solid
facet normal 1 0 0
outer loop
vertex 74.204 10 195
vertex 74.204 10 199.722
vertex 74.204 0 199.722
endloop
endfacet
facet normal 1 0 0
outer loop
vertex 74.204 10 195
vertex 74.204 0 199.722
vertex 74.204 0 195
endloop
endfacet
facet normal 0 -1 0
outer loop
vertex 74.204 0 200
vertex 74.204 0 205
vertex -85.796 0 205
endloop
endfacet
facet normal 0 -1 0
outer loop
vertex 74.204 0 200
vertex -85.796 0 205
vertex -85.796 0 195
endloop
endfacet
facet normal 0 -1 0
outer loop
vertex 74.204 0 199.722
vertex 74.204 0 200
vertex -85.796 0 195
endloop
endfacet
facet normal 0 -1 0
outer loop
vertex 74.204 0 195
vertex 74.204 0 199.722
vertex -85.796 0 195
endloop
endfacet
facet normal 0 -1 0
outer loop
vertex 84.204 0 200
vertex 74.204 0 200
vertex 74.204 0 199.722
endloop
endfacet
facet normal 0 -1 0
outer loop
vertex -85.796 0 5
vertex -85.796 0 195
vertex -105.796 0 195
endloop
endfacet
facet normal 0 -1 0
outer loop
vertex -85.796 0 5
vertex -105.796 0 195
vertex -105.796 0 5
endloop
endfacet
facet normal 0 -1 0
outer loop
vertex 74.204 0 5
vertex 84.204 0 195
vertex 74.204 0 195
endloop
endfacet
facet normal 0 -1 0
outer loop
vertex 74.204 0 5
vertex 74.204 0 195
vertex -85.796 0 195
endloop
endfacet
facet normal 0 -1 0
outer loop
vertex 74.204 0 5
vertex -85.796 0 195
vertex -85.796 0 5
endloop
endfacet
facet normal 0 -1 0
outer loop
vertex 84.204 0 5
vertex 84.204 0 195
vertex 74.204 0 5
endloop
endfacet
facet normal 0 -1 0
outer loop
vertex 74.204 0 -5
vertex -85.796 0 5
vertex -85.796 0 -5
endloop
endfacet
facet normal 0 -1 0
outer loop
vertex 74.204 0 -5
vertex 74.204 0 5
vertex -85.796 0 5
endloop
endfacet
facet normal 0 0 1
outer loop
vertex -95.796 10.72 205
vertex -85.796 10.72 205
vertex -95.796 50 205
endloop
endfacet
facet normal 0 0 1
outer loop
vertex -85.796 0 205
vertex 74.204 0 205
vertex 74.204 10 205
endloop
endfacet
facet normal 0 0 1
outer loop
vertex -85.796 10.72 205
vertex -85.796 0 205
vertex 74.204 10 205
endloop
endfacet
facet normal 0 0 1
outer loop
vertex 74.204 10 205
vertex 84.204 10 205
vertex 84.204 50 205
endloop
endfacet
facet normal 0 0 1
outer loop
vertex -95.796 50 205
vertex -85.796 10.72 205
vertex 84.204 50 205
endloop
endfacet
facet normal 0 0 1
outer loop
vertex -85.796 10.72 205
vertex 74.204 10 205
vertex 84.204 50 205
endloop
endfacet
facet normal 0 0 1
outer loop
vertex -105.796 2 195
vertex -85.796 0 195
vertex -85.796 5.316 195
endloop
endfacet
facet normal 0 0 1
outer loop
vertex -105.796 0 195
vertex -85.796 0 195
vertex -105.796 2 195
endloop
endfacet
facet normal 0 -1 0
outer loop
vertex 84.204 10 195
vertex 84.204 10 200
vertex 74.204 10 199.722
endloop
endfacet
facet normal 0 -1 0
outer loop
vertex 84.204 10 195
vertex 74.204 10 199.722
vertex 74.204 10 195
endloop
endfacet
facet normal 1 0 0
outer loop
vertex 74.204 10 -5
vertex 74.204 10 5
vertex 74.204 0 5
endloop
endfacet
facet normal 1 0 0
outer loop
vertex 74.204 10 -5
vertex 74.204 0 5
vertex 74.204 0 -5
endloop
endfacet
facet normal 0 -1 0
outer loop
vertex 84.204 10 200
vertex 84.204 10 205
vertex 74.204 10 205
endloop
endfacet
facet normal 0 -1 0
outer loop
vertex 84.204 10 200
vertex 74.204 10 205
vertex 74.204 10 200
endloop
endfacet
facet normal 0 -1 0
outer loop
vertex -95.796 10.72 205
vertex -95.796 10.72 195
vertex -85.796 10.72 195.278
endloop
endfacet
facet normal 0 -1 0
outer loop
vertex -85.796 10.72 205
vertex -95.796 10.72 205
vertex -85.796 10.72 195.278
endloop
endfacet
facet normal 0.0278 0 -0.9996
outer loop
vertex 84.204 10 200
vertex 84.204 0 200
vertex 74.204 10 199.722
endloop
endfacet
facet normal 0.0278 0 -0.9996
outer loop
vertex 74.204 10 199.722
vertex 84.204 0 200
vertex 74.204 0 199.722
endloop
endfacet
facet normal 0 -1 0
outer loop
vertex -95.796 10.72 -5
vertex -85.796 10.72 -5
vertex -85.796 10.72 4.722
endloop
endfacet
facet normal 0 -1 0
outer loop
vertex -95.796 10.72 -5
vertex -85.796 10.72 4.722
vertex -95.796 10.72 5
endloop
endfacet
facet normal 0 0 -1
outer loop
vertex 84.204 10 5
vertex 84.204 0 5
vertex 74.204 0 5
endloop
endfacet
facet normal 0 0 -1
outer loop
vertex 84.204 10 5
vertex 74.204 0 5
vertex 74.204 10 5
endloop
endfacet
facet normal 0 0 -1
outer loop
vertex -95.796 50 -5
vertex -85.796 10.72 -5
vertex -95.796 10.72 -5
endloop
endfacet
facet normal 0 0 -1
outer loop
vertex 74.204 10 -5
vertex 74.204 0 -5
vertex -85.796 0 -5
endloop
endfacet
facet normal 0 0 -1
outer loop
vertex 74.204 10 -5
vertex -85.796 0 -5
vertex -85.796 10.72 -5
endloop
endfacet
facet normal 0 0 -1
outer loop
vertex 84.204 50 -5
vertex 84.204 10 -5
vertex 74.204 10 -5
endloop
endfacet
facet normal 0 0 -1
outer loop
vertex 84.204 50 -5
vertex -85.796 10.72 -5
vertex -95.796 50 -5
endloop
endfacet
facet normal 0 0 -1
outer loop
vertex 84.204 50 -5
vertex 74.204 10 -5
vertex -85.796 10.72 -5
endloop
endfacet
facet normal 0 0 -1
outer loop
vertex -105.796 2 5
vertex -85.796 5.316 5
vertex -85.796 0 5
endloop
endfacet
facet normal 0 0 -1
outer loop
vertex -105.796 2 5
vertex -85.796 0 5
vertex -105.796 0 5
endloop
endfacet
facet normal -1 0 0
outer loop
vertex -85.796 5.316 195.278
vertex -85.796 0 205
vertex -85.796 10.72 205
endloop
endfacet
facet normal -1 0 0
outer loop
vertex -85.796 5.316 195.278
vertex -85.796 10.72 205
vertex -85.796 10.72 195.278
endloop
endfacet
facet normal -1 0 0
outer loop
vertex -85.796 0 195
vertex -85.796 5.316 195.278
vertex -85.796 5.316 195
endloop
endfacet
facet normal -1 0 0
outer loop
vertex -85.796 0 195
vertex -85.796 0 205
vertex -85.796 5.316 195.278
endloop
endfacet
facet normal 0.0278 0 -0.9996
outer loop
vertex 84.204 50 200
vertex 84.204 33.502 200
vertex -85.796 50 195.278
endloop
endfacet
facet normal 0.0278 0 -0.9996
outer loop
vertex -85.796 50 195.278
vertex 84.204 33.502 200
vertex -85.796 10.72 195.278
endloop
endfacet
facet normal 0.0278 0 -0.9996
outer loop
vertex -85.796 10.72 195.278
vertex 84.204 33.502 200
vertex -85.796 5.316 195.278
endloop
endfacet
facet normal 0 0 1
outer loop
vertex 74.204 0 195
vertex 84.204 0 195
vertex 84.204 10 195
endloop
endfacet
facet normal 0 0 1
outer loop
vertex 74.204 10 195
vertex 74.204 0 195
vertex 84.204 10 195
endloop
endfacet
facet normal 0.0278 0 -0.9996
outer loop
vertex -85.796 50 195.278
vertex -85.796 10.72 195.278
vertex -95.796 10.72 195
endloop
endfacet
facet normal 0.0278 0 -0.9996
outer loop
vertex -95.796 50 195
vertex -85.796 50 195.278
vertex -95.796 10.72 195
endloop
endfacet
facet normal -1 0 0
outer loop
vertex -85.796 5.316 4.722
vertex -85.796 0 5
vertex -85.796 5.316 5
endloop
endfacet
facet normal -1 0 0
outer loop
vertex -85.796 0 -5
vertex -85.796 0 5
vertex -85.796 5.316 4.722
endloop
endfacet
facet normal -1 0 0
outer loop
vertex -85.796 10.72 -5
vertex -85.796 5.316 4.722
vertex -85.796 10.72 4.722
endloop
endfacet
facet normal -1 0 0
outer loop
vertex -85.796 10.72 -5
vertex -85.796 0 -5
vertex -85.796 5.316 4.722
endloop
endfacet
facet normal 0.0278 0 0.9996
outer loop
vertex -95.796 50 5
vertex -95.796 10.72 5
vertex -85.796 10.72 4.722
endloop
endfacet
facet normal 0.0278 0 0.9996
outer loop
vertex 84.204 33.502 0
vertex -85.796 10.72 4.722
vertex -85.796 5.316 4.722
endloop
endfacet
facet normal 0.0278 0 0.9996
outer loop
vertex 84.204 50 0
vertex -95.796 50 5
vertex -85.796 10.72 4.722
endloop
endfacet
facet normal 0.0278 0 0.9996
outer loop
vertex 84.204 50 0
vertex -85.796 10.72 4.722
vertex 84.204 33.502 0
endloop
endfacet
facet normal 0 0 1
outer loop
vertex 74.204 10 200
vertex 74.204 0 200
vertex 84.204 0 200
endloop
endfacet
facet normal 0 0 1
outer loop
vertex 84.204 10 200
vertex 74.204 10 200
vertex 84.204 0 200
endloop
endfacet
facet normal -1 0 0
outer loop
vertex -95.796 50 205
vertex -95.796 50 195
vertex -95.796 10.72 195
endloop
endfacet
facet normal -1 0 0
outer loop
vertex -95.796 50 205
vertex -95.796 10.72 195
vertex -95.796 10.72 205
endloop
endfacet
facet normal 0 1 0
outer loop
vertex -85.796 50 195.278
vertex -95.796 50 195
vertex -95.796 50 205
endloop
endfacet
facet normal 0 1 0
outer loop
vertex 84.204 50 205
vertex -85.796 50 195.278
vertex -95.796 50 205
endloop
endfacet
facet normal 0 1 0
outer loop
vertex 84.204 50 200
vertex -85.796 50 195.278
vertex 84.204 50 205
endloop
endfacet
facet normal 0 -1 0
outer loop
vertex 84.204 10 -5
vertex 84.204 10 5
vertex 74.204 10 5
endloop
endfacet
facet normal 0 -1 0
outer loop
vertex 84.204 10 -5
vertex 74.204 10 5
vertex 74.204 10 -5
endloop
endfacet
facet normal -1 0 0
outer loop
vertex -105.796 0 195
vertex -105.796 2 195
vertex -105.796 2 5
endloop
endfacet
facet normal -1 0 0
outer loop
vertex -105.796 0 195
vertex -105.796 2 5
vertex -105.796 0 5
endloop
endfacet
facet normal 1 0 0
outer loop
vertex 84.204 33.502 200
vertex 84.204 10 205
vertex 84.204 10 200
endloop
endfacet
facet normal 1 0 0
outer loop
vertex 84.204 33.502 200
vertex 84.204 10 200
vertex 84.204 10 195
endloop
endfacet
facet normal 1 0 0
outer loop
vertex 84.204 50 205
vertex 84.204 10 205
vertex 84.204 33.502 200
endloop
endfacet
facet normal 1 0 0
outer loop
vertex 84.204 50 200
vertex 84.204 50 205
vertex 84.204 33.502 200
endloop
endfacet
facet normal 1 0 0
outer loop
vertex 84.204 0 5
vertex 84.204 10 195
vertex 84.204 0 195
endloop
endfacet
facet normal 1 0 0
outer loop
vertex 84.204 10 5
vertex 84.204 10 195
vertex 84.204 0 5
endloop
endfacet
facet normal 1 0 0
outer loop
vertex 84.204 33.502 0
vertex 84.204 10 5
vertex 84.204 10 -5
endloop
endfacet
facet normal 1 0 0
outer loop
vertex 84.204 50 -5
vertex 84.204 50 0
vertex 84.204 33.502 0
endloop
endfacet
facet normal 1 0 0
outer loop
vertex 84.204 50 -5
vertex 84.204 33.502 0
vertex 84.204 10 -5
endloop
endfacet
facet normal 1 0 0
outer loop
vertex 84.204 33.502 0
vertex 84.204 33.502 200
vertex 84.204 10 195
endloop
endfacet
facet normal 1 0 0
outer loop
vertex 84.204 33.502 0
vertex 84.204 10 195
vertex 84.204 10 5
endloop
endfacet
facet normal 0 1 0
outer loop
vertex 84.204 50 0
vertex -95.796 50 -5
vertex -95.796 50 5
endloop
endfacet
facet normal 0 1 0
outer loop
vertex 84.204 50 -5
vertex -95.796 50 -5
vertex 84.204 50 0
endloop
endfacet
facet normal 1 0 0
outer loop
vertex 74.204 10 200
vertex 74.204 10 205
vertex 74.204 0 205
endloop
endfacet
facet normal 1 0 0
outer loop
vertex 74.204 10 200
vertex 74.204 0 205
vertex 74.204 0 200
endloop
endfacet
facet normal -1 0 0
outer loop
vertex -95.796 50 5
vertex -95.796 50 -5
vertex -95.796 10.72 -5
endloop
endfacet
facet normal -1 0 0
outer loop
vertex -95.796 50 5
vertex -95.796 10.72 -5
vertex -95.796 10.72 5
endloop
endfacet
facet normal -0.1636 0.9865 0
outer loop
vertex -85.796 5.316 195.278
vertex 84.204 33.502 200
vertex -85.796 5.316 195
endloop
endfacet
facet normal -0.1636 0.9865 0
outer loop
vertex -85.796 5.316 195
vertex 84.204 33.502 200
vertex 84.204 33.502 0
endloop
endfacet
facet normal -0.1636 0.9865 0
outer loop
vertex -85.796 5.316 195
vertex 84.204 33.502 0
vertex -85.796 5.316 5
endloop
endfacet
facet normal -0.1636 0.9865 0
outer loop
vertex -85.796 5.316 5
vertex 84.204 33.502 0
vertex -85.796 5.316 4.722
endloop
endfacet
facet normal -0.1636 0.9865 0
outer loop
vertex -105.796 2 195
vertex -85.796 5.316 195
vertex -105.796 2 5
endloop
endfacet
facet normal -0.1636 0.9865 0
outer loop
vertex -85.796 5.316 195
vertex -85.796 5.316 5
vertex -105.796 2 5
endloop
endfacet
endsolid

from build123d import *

# Parameters (mm, degrees)
BOSS_EXTRU_1_DEPTH      = 200
ESQUISSE4_W             = 5
ESQUISSE4_H             = 50
BOSS_EXTRU_4_DEPTH      = 180
BOSS_EXTRU_7_REACH      = 238.046
ESQUISSE5_W             = 10
ESQUISSE5_H             = 10
ENL_V_MAT_EXTRU_1_DEPTH = 10
ESQUISSE6_W             = 20
ESQUISSE6_H             = 10.719834163
ENL_V_MAT_EXTRU_2_DEPTH = 10
SYM_TRIE3_DEPTH         = 10.719834163
SYM_TRIE3_2_DEPTH       = 50
SYM_TRIE3_START         = 10.719834163
SYM_TRIE3_3_DEPTH       = 39.280165837


# Read off the part's stored shape, not the designer's step: Symétrie3
with BuildPart() as part:
    # Esquisse1 → Boss.-Extru.1 (new body)
    with BuildSketch(Plane.XY):
        Polygon((-105.796013405, 0), (84.203986595, 0), (84.203986595, 33.502126335), (-105.796013405, 2), align=None)
    extrude(amount=BOSS_EXTRU_1_DEPTH)

    # Esquisse4 → Boss.-Extru.4 (add)
    with BuildSketch(Plane(origin=(84.203986595, 0, 0), x_dir=(0, 0, -1), z_dir=(1, 0, 0))):
        with Locations((-202.5, 25)):
            Rectangle(ESQUISSE4_W, ESQUISSE4_H)
        with Locations((2.5, 25)):
            Rectangle(ESQUISSE4_W, ESQUISSE4_H)
    extrude(amount=-BOSS_EXTRU_4_DEPTH)

    # Boss.-Extru.7: up to this plane
    boss_extru_7_end = Plane(origin=(-105.796013405, 2, 200), z_dir=(0.16356768062493265, -0.9865321149638162, 0))
    # Esquisse8 → Boss.-Extru.7 (add, up to the surface)
    with BuildSketch(Plane(origin=(0, 50, 0), x_dir=(1, 0, 0), z_dir=(0, 1, 0)), mode=Mode.PRIVATE) as boss_extru_7_sk1:
        Polygon((84.203986595, 0), (-95.796013405, 0), (-95.796013405, -5), align=None)
    boss_extru_7_tool1 = split(extrude(boss_extru_7_sk1.sketch, amount=-BOSS_EXTRU_7_REACH, mode=Mode.PRIVATE), bisect_by=boss_extru_7_end, keep=Keep.BOTH, mode=Mode.PRIVATE)
    add(boss_extru_7_tool1.solids().sort_by_distance((-35.796013, 50, 1.666667))[0])

    # Esquisse5 → Enlèv. mat.-Extru.1 (cut)
    with BuildSketch(Plane(origin=(84.203986595, 0, 0), x_dir=(0, 0, -1), z_dir=(1, 0, 0))):
        with Locations((-200, 5)):
            Rectangle(ESQUISSE5_W, ESQUISSE5_H)
        with Locations((0, 5)):
            Rectangle(ESQUISSE5_W, ESQUISSE5_H)
    extrude(amount=-ENL_V_MAT_EXTRU_1_DEPTH, mode=Mode.SUBTRACT)

    # Esquisse6 → Enlèv. mat.-Extru.2 (cut)
    with BuildSketch(Plane(origin=(0, 0, -5), x_dir=(-1, 0, 0), z_dir=(0, 0, -1))):
        with Locations((95.796013405, 5.359917081)):
            Rectangle(ESQUISSE6_W, ESQUISSE6_H)
    extrude(amount=-ENL_V_MAT_EXTRU_2_DEPTH, mode=Mode.SUBTRACT)

    # Symétrie3 outline → Symétrie3 (cut)
    with BuildSketch(Plane(origin=(0, 0, 0), x_dir=(1, 0, 0), z_dir=(0, 1, 0))):
        Polygon((-95.796013405, -200), (-95.796013405, -205), (-85.796013405, -205), (-85.796013405, -195), (-105.796013405, -195), (-105.796013405, -200), align=None)
    extrude(amount=SYM_TRIE3_DEPTH, mode=Mode.SUBTRACT)

    # Sym_trie3 2 outline → Sym_trie3 2 (add)
    with BuildSketch(Plane(origin=(0, 0, 0), x_dir=(1, 0, 0), z_dir=(0, 1, 0))):
        Polygon((-85.796013405, -195.277777778), (-85.796013405, -200), (84.203986595, -200), align=None)
    extrude(amount=SYM_TRIE3_2_DEPTH)

    # Sym_trie3 3 outline → Sym_trie3 3 (add)
    with BuildSketch(Plane(origin=(0, 0, 0), x_dir=(1, 0, 0), z_dir=(0, 1, 0)).offset(SYM_TRIE3_START)):
        Polygon((-95.796013405, -195), (-95.796013405, -200), (-85.796013405, -200), (-85.796013405, -195.277777778), align=None)
    extrude(amount=SYM_TRIE3_3_DEPTH)


solid = part.part
